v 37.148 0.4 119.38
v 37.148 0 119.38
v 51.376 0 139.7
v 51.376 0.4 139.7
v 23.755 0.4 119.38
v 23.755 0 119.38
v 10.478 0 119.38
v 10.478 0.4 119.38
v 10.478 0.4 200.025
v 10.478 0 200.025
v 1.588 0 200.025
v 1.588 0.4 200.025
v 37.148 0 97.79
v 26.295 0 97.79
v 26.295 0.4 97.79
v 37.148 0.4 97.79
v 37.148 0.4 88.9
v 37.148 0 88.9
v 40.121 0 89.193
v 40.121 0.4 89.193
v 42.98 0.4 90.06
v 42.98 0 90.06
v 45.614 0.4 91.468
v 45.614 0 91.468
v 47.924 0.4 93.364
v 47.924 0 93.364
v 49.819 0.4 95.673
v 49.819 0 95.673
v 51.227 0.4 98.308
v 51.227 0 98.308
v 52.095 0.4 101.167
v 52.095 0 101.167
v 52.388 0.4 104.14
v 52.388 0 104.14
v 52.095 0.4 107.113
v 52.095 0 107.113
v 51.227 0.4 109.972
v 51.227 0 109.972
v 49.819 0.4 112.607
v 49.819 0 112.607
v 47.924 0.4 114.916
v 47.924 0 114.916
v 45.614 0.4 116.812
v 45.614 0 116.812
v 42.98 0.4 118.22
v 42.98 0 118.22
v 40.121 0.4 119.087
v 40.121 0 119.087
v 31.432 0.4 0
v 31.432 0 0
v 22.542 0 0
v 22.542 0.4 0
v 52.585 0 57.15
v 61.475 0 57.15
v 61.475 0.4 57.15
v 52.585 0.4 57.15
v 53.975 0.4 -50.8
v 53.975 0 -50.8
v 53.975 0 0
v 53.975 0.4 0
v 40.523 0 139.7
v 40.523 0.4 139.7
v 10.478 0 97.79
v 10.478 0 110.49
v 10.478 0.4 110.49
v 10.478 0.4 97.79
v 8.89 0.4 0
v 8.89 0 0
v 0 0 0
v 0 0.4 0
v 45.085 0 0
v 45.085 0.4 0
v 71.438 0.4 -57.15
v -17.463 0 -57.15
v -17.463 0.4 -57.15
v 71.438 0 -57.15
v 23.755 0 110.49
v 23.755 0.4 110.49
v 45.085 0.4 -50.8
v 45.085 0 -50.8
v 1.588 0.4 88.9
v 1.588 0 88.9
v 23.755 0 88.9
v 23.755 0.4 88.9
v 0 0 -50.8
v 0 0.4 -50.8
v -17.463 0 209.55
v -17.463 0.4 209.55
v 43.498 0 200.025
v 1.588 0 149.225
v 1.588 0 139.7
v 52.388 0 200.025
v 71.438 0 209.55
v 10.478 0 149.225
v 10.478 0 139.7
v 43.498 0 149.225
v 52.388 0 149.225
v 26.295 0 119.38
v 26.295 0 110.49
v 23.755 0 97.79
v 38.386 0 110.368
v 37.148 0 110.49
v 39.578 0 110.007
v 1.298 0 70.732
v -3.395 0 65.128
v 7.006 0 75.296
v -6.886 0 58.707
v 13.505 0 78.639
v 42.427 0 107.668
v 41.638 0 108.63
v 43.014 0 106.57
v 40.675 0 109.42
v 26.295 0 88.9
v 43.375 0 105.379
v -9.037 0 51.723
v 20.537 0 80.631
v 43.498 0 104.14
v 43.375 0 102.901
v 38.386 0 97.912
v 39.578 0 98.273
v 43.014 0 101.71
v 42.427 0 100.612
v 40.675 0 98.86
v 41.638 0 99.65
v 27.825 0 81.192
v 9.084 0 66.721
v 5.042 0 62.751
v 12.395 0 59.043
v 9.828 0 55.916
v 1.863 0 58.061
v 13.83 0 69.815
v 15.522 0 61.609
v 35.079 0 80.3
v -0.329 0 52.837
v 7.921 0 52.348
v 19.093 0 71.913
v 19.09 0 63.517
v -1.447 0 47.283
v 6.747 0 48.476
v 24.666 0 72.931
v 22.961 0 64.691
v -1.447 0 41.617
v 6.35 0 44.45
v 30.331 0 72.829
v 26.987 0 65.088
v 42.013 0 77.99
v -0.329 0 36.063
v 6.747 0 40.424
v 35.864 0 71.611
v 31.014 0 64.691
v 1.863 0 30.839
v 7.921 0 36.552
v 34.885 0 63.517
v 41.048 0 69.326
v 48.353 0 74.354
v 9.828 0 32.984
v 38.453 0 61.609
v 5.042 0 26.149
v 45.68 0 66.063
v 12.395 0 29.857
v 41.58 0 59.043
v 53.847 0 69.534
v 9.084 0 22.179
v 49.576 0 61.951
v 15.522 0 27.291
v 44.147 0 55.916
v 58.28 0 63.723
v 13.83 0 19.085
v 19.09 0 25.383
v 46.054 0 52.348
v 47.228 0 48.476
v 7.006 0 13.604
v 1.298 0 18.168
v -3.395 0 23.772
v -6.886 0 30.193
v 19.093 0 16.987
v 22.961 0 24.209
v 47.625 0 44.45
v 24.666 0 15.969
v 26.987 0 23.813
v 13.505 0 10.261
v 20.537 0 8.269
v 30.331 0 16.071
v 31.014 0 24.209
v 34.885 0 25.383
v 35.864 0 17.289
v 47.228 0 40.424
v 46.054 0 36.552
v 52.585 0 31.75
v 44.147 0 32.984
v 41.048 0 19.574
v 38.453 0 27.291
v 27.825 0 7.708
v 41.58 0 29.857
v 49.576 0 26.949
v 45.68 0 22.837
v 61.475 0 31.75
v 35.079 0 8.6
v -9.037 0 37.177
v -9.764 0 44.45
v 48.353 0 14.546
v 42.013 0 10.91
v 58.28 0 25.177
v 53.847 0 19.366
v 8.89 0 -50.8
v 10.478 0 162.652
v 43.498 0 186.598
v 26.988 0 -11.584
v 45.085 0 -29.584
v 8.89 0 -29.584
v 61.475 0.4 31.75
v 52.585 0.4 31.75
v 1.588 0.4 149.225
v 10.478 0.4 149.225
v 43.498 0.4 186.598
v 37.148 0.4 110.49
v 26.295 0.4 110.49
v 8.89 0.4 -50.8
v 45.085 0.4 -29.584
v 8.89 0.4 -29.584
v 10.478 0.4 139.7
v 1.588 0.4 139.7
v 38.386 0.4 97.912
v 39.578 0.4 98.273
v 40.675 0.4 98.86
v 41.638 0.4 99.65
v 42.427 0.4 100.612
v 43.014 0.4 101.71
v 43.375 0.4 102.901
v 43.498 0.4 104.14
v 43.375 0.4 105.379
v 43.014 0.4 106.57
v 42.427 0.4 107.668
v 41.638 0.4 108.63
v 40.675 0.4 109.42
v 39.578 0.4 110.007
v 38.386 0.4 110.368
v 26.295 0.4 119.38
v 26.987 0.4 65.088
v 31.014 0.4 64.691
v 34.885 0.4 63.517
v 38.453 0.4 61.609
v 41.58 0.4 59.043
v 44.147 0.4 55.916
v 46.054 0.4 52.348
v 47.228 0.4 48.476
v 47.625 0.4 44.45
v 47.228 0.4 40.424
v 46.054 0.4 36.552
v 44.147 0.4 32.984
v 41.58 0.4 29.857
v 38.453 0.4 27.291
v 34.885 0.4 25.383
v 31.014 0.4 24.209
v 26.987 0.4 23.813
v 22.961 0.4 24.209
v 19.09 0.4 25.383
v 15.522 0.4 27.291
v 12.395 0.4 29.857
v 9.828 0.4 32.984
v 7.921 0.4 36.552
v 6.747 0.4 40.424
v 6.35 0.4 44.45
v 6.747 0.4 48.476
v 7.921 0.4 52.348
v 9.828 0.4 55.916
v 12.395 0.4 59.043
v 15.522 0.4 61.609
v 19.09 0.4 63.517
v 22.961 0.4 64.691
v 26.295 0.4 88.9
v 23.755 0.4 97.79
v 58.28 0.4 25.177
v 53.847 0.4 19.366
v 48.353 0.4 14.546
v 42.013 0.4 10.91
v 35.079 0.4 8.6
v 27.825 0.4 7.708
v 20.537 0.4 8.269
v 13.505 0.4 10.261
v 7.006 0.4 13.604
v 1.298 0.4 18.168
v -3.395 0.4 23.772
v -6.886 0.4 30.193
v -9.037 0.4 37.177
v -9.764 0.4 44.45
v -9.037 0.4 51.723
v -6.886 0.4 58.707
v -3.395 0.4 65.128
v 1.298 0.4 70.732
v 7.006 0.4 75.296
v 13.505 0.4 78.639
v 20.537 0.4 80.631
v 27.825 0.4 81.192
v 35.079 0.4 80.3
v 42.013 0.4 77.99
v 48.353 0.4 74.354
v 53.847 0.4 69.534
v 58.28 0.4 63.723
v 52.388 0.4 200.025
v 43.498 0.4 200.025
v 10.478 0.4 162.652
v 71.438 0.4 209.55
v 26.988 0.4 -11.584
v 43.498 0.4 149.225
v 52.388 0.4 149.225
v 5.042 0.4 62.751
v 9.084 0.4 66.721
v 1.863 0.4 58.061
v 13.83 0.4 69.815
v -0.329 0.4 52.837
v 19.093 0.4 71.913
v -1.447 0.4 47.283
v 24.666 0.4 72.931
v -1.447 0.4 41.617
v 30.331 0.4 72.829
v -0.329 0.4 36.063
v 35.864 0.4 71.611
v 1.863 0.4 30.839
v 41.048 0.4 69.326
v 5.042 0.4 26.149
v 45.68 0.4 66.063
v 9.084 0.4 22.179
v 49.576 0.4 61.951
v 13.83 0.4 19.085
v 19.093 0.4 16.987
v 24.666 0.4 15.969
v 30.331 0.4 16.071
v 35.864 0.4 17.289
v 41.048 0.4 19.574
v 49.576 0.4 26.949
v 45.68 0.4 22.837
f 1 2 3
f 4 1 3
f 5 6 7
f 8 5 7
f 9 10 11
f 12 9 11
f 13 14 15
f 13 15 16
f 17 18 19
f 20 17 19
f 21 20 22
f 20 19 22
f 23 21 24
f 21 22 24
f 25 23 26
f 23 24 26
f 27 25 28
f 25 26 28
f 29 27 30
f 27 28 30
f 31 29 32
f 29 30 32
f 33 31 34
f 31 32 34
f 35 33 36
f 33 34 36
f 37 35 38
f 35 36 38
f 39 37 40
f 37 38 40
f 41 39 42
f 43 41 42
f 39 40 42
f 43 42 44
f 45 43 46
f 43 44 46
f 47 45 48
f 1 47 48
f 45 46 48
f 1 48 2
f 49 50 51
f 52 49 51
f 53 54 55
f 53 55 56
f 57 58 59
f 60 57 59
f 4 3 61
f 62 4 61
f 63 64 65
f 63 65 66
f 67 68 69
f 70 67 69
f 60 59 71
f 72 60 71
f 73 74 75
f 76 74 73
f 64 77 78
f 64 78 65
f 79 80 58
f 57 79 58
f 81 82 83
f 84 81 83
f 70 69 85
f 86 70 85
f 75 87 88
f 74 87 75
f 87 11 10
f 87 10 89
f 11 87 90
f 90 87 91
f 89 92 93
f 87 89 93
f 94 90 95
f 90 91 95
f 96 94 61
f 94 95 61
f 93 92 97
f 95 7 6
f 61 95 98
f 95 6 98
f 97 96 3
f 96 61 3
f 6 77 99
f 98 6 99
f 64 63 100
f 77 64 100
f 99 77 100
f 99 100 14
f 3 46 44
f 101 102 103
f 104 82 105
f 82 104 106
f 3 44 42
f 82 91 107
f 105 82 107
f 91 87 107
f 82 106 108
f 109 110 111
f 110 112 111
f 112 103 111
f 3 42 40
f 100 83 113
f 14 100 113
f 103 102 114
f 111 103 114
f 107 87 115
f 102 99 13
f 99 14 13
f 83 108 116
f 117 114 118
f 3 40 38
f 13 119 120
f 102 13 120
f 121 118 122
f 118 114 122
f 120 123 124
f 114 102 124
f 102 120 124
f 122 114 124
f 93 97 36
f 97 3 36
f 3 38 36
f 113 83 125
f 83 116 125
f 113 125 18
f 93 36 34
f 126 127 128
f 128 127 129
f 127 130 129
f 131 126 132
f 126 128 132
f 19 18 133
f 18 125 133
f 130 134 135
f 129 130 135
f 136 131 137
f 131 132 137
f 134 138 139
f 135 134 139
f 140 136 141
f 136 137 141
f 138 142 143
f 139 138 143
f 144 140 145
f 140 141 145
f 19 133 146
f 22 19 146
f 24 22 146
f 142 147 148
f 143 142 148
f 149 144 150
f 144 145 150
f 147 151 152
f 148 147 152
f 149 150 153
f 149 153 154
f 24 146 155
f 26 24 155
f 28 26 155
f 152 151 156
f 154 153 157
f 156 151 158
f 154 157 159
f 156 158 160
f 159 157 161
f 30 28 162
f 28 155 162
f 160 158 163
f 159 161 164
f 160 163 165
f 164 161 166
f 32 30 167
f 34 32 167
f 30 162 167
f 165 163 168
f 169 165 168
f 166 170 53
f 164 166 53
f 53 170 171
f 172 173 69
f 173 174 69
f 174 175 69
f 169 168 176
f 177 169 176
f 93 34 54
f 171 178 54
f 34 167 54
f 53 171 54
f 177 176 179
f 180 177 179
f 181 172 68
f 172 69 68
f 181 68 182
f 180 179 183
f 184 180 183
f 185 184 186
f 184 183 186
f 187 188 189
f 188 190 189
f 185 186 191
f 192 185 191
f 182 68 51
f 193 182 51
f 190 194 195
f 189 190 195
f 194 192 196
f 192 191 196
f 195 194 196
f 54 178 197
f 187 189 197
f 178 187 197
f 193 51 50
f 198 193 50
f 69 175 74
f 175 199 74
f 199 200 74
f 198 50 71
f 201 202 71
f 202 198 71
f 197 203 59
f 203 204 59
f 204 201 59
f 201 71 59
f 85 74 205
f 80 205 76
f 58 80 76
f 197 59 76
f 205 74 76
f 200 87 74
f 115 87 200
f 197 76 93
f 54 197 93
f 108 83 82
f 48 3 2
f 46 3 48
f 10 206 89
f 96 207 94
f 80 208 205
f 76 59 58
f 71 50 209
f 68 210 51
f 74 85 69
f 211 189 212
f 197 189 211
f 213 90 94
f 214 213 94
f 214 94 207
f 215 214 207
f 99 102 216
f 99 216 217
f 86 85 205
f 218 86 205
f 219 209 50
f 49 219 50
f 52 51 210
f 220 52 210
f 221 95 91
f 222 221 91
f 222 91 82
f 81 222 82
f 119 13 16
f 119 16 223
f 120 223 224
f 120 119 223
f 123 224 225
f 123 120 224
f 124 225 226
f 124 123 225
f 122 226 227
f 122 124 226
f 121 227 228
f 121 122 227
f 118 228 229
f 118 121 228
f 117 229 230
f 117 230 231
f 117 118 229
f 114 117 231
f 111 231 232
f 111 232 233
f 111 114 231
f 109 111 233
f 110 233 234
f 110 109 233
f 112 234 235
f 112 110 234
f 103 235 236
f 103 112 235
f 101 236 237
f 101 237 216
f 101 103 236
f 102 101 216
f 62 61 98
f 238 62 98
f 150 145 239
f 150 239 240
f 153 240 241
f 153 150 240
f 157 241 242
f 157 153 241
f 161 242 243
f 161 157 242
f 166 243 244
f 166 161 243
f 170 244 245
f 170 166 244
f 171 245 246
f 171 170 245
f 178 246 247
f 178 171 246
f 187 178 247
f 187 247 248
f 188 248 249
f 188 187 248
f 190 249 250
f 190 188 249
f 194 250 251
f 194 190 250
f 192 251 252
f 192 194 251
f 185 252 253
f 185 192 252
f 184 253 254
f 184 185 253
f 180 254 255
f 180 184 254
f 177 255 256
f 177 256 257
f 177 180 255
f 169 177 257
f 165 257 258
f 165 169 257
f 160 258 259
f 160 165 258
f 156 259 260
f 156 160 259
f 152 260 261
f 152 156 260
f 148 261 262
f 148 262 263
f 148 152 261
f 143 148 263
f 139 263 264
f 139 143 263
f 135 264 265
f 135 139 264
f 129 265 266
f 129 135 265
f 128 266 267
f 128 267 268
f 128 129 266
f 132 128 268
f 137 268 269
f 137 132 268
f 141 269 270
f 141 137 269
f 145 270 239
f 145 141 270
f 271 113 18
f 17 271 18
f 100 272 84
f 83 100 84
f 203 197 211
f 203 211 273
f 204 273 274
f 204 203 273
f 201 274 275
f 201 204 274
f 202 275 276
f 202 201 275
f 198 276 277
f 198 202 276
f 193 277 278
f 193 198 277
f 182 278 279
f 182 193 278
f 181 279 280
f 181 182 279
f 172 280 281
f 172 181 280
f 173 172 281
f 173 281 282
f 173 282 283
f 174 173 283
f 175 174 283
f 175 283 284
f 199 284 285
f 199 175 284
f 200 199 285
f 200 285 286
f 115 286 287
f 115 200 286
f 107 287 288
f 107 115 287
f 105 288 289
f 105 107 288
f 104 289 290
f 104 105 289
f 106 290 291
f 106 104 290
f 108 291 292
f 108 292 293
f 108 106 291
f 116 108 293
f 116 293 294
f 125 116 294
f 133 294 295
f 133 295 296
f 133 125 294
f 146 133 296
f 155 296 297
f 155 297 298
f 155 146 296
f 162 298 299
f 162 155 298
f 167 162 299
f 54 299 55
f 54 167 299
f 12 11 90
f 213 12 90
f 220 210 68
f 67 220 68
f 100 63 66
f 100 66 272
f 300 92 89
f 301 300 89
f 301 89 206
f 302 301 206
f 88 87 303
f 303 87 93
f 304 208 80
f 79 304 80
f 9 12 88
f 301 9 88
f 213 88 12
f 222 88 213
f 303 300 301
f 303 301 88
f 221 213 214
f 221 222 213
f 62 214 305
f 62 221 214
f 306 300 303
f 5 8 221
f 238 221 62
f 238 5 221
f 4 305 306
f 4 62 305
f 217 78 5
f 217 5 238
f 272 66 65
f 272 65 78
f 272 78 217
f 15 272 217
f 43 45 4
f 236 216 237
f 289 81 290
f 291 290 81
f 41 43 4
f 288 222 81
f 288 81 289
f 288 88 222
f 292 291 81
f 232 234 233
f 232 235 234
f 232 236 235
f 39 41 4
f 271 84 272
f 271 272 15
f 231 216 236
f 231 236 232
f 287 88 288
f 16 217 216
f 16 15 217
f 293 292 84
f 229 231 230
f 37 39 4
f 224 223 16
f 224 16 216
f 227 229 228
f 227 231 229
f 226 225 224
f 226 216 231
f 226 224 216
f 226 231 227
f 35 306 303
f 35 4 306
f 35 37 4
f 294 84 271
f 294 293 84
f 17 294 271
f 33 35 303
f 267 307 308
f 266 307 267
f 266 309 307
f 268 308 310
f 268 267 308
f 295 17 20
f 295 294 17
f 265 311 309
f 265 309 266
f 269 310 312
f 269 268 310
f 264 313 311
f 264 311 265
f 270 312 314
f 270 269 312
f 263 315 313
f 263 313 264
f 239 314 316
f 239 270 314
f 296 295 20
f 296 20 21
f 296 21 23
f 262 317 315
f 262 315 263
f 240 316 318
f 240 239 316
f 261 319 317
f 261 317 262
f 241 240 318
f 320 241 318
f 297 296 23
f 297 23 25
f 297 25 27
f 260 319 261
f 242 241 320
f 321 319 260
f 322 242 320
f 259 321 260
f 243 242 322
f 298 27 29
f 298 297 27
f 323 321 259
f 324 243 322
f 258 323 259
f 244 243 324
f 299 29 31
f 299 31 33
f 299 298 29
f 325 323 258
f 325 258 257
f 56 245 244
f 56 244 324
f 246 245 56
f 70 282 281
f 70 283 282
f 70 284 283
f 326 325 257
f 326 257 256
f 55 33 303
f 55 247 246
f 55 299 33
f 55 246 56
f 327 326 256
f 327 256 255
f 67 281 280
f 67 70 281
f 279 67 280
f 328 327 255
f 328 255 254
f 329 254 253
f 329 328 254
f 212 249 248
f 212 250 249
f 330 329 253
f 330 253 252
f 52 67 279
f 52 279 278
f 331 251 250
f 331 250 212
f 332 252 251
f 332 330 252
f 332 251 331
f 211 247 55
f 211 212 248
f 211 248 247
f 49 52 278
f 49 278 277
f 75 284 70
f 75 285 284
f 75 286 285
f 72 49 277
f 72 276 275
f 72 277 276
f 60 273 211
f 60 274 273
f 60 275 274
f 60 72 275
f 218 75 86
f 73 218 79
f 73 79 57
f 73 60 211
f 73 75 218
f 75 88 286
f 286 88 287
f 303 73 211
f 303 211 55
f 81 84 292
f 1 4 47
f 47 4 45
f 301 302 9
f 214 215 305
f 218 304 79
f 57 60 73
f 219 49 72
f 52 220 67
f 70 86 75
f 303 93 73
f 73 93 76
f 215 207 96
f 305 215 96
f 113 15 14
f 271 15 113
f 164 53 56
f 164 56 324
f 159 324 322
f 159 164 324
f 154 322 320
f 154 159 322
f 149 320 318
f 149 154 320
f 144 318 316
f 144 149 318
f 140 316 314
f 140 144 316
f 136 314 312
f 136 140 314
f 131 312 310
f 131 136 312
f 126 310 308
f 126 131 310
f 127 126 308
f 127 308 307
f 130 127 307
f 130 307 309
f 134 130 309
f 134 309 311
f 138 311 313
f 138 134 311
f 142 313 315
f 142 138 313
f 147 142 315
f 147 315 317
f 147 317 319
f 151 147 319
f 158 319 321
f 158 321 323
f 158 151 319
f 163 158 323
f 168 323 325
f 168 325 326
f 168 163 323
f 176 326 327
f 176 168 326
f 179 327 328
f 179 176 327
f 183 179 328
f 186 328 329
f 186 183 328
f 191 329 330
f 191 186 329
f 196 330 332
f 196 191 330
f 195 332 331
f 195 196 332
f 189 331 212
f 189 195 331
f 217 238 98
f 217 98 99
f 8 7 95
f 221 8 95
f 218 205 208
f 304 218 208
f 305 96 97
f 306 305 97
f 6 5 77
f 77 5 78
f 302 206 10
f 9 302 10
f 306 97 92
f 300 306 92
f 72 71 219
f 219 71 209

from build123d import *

# Parameters (mm, degrees)
SKETCH1_W             = 88.9
SKETCH1_H             = 266.7
SKETCH1_R             = 20.6375
BOSS_EXTRUDE1_DEPTH   = 0.4
BOSS_EXTRUDE1_2_DEPTH = 0.4
SKETCH2_W             = 2.54
SKETCH2_H             = 30.48
BOSS_EXTRUDE2_DEPTH   = 0.4


with BuildPart() as part:
    # Sketch1 → Boss-Extrude1 (new body)
    with BuildSketch(Plane(origin=(0, 0, 0), x_dir=(1, 0, 0), z_dir=(0, 1, 0))):
        with Locations((26.9875, -76.2)):
            Rectangle(SKETCH1_W, SKETCH1_H)
        with Locations(Location((26.9875, -44.45, 0), (0, 0, 270))):
            Circle(SKETCH1_R, mode=Mode.SUBTRACT)
        Polygon((10.4775, -162.651716191), (10.4775, -200.025), (1.5875, -200.025), (1.5875, -149.225), (10.4775, -149.225), (43.4975, -186.598283809), (43.4975, -149.225), (52.3875, -149.225), (52.3875, -200.025), (43.4975, -200.025), align=None, mode=Mode.SUBTRACT)
        Polygon((31.4325, 0), (22.5425, 0), (8.89, 29.583775771), (8.89, 0), (0, 0), (0, 50.8), (8.89, 50.8), (26.9875, 11.584297234), (45.085, 50.8), (53.975, 50.8), (53.975, 0), (45.085, 0), (45.085, 29.583775771), align=None, mode=Mode.SUBTRACT)
        with BuildLine():
            ThreePointArc((61.475168351, -31.75), (-9.764224698, -44.45), (61.475168351, -57.15))
            Line((61.475168351, -57.15), (52.585168351, -57.15))
            ThreePointArc((52.585168351, -57.15), (-1.5875, -44.45), (52.585168351, -31.75))
            Line((52.585168351, -31.75), (61.475168351, -31.75))
        make_face(mode=Mode.SUBTRACT)
        with BuildLine():
            Line((1.5875, -88.9), (37.1475, -88.9))
            ThreePointArc((37.1475, -88.9), (52.3875, -104.14), (37.1475, -119.38))
            Line((37.1475, -119.38), (51.375717176, -139.7))
            Line((51.375717176, -139.7), (40.523031082, -139.7))
            Line((40.523031082, -139.7), (26.294813906, -119.38))
            Line((26.294813906, -119.38), (10.4775, -119.38))
            Line((10.4775, -119.38), (10.4775, -139.7))
            Line((10.4775, -139.7), (1.5875, -139.7))
            Line((1.5875, -139.7), (1.5875, -88.9))
        make_face(mode=Mode.SUBTRACT)
    extrude(amount=BOSS_EXTRUDE1_DEPTH)



with BuildPart() as body_2:
    # Sketch1 → Boss-Extrude1 2 (new body)
    with BuildSketch(Plane(origin=(0, 0, 0), x_dir=(1, 0, 0), z_dir=(0, 1, 0))):
        with BuildLine():
            ThreePointArc((37.1475, -97.79), (43.4975, -104.14), (37.1475, -110.49))
            Line((37.1475, -110.49), (10.4775, -110.49))
            Line((10.4775, -110.49), (10.4775, -97.79))
            Line((10.4775, -97.79), (37.1475, -97.79))
        make_face()
    extrude(amount=BOSS_EXTRUDE1_2_DEPTH)


with BuildPart() as part_1:
    add(part.part)

    add(body_2.part)  # Boss-Extrude2 merges body 2
    # Sketch2 → Boss-Extrude2 (add)
    with BuildSketch(Plane(origin=(0, 0.4, 0), x_dir=(1, 0, 0), z_dir=(0, 1, 0))):
        with Locations((25.024813906, -104.14)):
            Rectangle(SKETCH2_W, SKETCH2_H)
    extrude(amount=-BOSS_EXTRUDE2_DEPTH)


solid = part_1.part
